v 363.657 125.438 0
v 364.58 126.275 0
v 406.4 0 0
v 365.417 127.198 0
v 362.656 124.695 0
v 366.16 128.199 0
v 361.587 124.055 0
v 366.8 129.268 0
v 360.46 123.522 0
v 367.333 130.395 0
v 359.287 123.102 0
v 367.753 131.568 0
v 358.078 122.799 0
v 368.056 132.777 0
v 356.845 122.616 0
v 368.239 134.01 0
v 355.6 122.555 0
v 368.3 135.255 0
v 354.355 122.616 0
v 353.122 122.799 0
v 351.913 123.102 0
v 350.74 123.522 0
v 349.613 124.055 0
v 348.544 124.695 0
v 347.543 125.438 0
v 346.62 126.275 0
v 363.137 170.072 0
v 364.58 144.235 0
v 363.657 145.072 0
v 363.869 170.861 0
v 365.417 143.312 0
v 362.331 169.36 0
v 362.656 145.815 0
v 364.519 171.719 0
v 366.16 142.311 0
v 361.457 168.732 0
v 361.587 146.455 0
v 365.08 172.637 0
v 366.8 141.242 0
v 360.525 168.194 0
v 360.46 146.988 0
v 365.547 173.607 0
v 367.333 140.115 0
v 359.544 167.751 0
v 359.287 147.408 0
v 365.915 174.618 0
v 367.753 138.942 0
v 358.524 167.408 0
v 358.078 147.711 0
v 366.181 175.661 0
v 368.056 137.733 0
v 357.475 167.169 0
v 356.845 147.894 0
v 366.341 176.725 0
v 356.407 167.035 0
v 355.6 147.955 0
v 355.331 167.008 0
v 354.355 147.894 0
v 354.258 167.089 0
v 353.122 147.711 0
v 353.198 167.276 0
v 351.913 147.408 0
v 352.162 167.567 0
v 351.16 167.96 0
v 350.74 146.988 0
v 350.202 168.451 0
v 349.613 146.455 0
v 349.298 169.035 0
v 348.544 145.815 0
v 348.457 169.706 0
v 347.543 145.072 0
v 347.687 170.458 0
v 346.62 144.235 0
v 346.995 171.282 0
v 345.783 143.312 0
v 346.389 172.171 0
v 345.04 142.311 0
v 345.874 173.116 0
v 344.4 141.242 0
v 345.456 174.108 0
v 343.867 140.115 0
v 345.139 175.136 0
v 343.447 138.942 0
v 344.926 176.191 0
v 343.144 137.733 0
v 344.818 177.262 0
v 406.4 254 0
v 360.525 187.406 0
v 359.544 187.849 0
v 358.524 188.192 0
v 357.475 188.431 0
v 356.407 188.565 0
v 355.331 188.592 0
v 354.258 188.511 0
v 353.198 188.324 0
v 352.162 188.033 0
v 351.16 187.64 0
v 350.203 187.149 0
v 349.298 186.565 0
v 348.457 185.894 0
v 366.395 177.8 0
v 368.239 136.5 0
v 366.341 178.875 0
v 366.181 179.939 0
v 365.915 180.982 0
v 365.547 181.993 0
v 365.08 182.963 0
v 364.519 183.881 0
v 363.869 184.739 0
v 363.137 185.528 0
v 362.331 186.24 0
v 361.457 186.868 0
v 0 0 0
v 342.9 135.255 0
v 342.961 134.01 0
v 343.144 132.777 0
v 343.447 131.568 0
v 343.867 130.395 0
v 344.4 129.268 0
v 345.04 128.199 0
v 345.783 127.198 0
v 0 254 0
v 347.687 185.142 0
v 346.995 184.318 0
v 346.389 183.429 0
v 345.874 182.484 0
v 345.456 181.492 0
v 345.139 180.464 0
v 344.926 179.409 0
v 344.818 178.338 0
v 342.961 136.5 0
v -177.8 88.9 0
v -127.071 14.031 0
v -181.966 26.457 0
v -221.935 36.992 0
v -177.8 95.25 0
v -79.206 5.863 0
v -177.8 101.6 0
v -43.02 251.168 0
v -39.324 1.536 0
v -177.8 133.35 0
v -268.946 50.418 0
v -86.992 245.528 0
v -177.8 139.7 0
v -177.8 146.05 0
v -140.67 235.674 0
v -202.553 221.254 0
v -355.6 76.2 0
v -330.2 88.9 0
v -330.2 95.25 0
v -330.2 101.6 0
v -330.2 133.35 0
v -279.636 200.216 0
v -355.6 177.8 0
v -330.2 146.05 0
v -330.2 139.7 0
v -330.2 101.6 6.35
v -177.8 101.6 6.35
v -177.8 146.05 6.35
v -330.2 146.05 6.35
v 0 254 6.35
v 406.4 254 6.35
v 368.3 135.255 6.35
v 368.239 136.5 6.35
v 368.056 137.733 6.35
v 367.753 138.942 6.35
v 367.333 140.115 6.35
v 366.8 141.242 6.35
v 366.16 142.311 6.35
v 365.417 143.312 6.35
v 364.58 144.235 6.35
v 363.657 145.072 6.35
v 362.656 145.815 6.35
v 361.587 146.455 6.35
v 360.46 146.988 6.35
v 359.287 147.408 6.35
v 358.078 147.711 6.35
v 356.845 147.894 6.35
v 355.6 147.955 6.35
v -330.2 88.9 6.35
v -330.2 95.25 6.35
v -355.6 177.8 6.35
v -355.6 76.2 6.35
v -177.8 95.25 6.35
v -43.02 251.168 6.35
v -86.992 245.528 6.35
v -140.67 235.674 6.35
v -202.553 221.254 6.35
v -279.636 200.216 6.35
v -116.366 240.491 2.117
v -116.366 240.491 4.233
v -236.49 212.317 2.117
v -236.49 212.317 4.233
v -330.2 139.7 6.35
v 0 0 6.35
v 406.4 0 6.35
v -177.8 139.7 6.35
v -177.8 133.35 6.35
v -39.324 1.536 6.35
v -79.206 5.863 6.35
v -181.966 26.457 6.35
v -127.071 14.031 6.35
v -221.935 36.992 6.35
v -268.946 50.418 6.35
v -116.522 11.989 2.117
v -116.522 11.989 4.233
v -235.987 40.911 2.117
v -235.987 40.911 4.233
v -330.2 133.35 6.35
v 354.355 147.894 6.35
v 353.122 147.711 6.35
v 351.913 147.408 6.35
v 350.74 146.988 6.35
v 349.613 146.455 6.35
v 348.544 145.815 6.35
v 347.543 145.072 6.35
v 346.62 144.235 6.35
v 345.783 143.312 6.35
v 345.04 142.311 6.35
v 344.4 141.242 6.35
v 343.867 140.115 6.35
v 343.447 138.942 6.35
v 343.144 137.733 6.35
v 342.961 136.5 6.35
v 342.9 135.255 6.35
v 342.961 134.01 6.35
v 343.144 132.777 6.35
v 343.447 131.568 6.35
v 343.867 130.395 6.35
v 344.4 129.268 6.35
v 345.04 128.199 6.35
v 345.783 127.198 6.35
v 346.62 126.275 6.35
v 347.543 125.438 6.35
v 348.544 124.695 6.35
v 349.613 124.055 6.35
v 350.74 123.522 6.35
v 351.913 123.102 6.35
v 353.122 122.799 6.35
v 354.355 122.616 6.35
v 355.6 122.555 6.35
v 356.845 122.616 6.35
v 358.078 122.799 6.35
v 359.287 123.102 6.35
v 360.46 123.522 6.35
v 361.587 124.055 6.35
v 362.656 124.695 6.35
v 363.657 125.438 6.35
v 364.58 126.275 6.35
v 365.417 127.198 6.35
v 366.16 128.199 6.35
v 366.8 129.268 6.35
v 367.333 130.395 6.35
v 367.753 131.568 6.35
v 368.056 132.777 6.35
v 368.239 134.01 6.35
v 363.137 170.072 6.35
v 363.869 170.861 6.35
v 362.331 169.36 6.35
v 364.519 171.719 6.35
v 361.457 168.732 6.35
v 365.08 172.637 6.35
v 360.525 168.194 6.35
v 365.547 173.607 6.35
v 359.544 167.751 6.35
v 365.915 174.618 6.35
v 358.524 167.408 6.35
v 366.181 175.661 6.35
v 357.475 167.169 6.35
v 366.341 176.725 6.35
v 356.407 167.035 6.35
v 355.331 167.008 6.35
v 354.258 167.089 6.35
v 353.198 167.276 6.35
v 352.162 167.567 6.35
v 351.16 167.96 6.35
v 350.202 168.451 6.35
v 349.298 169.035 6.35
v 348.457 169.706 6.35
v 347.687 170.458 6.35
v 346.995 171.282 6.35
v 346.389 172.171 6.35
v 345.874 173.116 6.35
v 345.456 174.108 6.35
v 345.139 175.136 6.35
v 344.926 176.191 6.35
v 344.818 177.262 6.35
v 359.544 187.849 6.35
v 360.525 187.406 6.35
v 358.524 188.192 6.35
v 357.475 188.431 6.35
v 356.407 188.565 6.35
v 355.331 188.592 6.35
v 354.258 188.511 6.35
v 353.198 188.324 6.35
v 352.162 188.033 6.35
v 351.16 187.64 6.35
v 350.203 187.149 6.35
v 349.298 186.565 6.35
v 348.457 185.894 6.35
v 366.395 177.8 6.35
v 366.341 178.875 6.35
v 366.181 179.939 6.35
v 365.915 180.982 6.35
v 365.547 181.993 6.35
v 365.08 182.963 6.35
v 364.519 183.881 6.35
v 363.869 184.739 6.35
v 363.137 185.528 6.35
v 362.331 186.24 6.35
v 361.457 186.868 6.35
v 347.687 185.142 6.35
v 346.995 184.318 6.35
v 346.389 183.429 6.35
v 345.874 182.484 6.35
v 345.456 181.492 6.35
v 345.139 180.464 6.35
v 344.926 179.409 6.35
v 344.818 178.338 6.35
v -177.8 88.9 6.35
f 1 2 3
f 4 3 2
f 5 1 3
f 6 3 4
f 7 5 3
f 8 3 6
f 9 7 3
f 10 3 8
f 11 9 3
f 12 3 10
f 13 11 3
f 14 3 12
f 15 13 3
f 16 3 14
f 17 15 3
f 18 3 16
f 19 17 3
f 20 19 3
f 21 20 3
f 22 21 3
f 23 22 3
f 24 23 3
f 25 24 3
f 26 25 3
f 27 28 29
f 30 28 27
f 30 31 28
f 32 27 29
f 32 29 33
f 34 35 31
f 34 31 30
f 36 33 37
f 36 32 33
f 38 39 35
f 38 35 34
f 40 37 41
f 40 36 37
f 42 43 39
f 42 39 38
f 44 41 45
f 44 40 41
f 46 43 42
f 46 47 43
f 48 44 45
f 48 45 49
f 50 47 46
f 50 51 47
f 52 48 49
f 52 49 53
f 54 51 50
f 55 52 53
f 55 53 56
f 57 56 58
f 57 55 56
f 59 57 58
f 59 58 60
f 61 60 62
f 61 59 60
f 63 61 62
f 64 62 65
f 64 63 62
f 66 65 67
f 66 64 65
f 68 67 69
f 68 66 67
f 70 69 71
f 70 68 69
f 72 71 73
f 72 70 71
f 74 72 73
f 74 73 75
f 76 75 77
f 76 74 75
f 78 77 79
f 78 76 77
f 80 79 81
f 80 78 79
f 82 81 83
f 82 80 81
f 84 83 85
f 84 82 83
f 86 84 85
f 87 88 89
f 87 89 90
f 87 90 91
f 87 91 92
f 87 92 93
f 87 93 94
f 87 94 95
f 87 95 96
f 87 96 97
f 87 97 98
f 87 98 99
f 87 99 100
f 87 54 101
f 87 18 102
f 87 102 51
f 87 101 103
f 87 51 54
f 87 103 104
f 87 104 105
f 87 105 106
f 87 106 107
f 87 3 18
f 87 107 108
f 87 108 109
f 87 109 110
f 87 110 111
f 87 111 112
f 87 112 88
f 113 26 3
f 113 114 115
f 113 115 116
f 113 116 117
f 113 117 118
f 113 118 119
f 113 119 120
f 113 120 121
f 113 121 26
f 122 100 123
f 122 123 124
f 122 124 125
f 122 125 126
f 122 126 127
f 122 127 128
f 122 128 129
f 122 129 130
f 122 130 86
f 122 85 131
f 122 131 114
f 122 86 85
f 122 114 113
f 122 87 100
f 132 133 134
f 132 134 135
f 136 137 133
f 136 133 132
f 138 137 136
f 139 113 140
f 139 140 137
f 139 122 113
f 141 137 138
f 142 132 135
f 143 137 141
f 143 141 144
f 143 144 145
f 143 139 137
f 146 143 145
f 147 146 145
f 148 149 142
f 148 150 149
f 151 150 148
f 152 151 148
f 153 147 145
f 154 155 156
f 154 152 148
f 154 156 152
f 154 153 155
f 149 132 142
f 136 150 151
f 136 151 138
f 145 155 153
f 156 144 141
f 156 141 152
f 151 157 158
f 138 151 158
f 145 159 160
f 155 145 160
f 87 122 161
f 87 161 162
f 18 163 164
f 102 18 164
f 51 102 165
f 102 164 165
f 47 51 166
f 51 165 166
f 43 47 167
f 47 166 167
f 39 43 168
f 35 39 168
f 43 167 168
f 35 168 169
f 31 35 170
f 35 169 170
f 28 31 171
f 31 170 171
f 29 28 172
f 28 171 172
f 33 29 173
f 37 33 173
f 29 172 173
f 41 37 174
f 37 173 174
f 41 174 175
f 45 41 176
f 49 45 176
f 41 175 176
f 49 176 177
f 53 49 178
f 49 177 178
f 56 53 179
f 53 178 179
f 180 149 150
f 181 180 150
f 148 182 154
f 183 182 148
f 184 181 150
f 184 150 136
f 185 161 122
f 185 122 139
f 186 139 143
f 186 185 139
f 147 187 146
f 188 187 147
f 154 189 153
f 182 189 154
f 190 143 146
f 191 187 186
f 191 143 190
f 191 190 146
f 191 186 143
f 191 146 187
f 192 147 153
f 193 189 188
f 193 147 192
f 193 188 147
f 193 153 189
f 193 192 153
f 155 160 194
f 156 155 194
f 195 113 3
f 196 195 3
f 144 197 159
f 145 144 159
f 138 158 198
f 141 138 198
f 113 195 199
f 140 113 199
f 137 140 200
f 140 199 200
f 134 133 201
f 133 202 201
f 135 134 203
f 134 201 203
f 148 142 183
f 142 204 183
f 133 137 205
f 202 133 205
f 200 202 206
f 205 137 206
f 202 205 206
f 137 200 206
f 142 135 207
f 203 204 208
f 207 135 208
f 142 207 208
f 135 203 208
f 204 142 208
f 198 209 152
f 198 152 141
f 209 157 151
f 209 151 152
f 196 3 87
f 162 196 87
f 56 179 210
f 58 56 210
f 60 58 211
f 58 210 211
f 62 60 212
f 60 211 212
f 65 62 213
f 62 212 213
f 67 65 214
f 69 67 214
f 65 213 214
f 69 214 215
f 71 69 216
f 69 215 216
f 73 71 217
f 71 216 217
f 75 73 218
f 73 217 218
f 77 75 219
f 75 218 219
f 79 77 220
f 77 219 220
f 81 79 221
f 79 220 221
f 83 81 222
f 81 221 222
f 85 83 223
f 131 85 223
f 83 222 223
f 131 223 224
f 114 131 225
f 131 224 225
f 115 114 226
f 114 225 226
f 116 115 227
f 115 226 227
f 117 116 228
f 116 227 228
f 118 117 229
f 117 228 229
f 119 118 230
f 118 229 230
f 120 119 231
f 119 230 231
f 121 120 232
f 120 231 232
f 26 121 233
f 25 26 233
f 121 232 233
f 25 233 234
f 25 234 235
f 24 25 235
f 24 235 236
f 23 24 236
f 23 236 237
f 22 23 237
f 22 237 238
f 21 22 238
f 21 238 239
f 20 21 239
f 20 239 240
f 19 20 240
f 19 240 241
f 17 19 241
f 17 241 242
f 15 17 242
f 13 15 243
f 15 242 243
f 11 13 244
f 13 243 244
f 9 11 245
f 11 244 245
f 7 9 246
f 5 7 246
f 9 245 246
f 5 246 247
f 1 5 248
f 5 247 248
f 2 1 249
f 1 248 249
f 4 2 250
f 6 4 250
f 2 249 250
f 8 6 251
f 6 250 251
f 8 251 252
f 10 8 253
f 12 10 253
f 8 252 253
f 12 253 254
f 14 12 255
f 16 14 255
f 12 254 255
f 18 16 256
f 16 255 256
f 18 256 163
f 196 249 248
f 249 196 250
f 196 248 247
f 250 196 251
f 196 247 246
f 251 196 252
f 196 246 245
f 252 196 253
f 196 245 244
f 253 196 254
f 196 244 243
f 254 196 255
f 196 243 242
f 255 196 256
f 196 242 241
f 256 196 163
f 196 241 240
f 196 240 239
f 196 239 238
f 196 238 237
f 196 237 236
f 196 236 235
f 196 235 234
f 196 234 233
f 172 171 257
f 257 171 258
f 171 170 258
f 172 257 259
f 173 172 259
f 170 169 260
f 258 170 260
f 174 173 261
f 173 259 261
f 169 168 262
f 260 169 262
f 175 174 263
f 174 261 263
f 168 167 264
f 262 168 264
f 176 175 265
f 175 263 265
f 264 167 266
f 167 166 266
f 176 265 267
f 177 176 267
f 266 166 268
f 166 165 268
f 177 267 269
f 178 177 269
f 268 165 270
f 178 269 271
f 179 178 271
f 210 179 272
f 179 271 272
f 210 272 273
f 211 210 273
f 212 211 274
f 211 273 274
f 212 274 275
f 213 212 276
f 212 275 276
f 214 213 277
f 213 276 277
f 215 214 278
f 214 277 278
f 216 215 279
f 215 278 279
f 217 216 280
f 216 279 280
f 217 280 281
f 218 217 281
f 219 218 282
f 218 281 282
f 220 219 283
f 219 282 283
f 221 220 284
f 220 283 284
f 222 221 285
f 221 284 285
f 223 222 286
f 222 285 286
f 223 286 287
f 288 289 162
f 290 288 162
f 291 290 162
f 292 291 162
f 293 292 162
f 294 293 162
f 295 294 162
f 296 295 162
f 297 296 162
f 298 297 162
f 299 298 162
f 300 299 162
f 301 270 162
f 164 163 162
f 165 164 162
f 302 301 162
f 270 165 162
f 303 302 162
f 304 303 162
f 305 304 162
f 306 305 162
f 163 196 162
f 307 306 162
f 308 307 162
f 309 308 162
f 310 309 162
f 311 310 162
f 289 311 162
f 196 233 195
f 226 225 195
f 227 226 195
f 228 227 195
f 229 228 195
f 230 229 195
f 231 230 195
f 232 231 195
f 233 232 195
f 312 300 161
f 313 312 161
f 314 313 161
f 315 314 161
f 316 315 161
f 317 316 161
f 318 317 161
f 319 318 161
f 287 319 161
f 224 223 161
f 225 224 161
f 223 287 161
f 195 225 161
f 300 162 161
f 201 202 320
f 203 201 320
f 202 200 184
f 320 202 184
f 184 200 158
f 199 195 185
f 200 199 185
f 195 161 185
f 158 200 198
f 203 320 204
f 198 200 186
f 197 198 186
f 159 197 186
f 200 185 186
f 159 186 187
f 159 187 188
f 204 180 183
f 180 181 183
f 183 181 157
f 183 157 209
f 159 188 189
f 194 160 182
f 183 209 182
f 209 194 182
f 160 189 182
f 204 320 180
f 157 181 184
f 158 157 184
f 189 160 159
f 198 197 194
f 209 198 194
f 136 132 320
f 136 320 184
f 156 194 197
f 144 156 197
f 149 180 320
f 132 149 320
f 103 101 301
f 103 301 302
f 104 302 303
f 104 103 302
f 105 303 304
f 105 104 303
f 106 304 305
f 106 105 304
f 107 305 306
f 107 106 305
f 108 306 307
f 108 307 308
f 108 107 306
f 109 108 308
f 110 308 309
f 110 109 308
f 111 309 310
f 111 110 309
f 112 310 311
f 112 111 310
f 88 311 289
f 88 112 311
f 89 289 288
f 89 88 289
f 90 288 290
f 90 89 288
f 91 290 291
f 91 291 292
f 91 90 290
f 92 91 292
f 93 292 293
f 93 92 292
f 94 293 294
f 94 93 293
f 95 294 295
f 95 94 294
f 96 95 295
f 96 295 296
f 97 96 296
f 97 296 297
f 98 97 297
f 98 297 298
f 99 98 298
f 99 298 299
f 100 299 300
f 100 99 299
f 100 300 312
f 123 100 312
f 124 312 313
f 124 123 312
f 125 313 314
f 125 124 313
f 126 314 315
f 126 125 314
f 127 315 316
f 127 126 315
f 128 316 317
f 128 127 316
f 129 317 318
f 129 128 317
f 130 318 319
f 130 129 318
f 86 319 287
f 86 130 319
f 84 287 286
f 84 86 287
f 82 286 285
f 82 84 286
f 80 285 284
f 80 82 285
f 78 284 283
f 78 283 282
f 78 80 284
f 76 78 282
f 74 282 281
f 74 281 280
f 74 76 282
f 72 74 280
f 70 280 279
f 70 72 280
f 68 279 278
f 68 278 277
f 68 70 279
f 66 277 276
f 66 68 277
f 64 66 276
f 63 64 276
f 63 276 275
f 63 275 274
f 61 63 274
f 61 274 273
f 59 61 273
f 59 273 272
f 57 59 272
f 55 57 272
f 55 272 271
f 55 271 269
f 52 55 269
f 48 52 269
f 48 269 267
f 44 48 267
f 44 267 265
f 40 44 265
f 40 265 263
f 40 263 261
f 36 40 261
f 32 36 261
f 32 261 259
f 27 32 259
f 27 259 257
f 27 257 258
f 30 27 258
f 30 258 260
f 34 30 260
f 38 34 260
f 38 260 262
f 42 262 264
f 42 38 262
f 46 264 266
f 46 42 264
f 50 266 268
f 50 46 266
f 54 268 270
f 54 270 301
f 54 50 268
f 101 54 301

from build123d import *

# Parameters (mm, degrees)
F0_W      = 406.4
F0_H      = 254
F0_R      = 10.795
F1_DEPTH  = 6.35
F2_W      = 101.6
F2_H      = 6.35
F3_DEPTH  = 355.6
F5_DEPTH  = 6.35
F7_DEPTH  = 6.35
F8_W      = 152.4
F8_H      = 31.75
F9_DEPTH  = 6.35
F11_DEPTH = 6.35
F12_W     = 152.4
F12_H     = 6.35
F13_DEPTH = 6.35
F15_DEPTH = 6.35


with BuildPart() as f1:
    # F0 (on Top) → F1 (new body)
    with BuildSketch(Plane.XY):
        with Locations((203.2, 127)):
            Rectangle(F0_W, F0_H)
        with Locations((355.6, 177.8)):
            Circle(F0_R, mode=Mode.SUBTRACT)
    extrude(amount=F1_DEPTH)

    # F2 (on face) → F3 (join)
    with BuildSketch(Plane(origin=(0, 0, 0), x_dir=(0, -1, 0), z_dir=(-1, 0, 0))):
        with Locations((-127, 3.175)):
            Rectangle(F2_W, F2_H)
    extrude(amount=F3_DEPTH)

    # F4 (on face) → F5 (join)
    with BuildSketch(Plane.XY.offset(6.35)):
        with BuildLine():
            Line((0, 177.8), (0, 254))
            add(Edge.make_bspline(
                [(0, 254), (-112.8963902593, 250.5958378315), (-238.5879904032, 212.7161622047), (-355.6, 177.8)],
                knots=[0, 0, 0, 0, 363.6726550072, 363.6726550072, 363.6726550072, 363.6726550072], degree=3))
            Line((-355.6, 177.8), (0, 177.8))
        make_face()
    extrude(amount=-F5_DEPTH)

    # F6 (on face) → F7 (join)
    with BuildSketch(Plane.XY.offset(6.35)):
        with BuildLine():
            add(Edge.make_bspline(
                [(0, 0), (-114.120438695, 0), (-236.8435710669, 41.2505157292), (-355.6, 76.2)],
                knots=[0, 0, 0, 0, 363.6726550072, 363.6726550072, 363.6726550072, 363.6726550072], degree=3))
            Line((0, 0), (0, 76.2))
            Line((0, 76.2), (-355.6, 76.2))
        make_face()
    extrude(amount=-F7_DEPTH)

    # F8 (on face) → F9 (cut)
    with BuildSketch(Plane.XY.offset(6.35)):
        with Locations((-254, 117.475)):
            Rectangle(F8_W, F8_H)
    extrude(amount=-F9_DEPTH, mode=Mode.SUBTRACT)

    # F10 (on face) → F11 (cut)
    with BuildSketch(Plane.XY.offset(6.35)):
        Polygon((-330.2, 146.05), (-330.2, 139.7), (-269.6087956429, 139.7), (-177.8, 139.7), (-177.8, 146.05), align=None)
    extrude(amount=-F11_DEPTH, mode=Mode.SUBTRACT)

    # F12 (on face) → F13 (cut)
    with BuildSketch(Plane.XY.offset(6.35)):
        with Locations((-254, 92.075)):
            Rectangle(F12_W, F12_H)
    extrude(amount=-F13_DEPTH, mode=Mode.SUBTRACT)

    # F14 (on face) → F15 (cut)
    with BuildSketch(Plane.XY.offset(6.35)):
        with BuildLine():
            ThreePointArc((368.3, 135.255), (364.5802561211, 144.2352561211), (355.6, 147.955))
            ThreePointArc((355.6, 147.955), (346.6197438789, 126.2747438789), (368.3, 135.255))
        make_face()
    extrude(amount=-F15_DEPTH, mode=Mode.SUBTRACT)


solid = f1.part
